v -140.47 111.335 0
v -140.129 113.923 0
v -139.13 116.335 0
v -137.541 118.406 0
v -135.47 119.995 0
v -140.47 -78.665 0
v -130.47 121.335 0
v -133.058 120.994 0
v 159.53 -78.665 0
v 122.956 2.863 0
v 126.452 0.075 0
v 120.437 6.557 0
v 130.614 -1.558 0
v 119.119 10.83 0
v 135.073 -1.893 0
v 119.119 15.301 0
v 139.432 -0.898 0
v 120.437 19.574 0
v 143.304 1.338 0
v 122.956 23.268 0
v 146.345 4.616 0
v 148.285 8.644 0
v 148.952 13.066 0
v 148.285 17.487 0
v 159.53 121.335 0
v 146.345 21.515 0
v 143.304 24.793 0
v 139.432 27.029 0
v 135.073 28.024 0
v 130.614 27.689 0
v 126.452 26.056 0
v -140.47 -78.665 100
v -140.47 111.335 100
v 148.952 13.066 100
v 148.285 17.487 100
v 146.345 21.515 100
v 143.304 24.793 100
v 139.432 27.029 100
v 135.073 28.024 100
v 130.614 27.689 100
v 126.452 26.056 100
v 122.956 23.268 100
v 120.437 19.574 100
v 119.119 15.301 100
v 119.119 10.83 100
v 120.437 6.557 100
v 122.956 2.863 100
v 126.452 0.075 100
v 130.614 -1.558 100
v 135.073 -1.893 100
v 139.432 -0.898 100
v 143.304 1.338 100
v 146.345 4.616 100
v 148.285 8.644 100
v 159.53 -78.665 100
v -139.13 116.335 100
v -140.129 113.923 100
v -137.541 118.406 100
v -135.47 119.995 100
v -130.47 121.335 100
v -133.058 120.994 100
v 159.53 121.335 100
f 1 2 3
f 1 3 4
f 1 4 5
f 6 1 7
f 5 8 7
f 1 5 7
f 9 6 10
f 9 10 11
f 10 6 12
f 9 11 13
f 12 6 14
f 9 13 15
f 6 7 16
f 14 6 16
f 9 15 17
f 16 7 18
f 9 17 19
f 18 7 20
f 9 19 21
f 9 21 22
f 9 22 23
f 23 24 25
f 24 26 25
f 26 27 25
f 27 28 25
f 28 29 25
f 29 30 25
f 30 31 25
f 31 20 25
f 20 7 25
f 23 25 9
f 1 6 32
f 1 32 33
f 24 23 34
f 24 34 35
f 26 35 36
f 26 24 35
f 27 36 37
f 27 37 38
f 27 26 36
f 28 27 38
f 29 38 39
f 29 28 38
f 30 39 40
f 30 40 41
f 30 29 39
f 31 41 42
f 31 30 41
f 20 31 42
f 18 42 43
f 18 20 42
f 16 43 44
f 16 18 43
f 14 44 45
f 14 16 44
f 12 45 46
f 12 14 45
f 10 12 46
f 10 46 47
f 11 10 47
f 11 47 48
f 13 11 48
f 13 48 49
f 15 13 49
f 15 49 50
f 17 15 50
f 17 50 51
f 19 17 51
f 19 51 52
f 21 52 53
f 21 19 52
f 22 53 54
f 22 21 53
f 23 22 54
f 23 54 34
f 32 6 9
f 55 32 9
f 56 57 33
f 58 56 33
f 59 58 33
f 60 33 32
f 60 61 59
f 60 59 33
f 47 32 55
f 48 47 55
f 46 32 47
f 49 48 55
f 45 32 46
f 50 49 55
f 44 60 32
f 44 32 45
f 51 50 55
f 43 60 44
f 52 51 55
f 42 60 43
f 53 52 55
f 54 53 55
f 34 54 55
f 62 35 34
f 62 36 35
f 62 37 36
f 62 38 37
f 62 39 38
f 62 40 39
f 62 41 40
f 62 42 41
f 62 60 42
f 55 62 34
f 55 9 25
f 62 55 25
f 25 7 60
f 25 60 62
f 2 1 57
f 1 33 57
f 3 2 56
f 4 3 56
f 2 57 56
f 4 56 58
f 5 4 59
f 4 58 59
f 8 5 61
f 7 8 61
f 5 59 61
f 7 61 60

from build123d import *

# Parameters (mm, degrees)
F0_W     = 300
F0_H     = 200
F0_R     = 15
F1_DEPTH = 100
F2_R     = 10


with BuildPart() as f1:
    # F0 (on Top) → F1 (new body)
    with BuildSketch(Plane.XY):
        with Locations((9.53036, 21.334988)):
            Rectangle(F0_W, F0_H)
        with Locations((133.951858, 13.06554)):
            Circle(F0_R, mode=Mode.SUBTRACT)
    extrude(amount=F1_DEPTH)

    # F2
    f2_edges = [f1.edges().sort_by_distance(p)[0] for p in [
        (-140.46964, 121.334988, 50),
    ]]
    fillet(f2_edges, radius=F2_R)


solid = f1.part
